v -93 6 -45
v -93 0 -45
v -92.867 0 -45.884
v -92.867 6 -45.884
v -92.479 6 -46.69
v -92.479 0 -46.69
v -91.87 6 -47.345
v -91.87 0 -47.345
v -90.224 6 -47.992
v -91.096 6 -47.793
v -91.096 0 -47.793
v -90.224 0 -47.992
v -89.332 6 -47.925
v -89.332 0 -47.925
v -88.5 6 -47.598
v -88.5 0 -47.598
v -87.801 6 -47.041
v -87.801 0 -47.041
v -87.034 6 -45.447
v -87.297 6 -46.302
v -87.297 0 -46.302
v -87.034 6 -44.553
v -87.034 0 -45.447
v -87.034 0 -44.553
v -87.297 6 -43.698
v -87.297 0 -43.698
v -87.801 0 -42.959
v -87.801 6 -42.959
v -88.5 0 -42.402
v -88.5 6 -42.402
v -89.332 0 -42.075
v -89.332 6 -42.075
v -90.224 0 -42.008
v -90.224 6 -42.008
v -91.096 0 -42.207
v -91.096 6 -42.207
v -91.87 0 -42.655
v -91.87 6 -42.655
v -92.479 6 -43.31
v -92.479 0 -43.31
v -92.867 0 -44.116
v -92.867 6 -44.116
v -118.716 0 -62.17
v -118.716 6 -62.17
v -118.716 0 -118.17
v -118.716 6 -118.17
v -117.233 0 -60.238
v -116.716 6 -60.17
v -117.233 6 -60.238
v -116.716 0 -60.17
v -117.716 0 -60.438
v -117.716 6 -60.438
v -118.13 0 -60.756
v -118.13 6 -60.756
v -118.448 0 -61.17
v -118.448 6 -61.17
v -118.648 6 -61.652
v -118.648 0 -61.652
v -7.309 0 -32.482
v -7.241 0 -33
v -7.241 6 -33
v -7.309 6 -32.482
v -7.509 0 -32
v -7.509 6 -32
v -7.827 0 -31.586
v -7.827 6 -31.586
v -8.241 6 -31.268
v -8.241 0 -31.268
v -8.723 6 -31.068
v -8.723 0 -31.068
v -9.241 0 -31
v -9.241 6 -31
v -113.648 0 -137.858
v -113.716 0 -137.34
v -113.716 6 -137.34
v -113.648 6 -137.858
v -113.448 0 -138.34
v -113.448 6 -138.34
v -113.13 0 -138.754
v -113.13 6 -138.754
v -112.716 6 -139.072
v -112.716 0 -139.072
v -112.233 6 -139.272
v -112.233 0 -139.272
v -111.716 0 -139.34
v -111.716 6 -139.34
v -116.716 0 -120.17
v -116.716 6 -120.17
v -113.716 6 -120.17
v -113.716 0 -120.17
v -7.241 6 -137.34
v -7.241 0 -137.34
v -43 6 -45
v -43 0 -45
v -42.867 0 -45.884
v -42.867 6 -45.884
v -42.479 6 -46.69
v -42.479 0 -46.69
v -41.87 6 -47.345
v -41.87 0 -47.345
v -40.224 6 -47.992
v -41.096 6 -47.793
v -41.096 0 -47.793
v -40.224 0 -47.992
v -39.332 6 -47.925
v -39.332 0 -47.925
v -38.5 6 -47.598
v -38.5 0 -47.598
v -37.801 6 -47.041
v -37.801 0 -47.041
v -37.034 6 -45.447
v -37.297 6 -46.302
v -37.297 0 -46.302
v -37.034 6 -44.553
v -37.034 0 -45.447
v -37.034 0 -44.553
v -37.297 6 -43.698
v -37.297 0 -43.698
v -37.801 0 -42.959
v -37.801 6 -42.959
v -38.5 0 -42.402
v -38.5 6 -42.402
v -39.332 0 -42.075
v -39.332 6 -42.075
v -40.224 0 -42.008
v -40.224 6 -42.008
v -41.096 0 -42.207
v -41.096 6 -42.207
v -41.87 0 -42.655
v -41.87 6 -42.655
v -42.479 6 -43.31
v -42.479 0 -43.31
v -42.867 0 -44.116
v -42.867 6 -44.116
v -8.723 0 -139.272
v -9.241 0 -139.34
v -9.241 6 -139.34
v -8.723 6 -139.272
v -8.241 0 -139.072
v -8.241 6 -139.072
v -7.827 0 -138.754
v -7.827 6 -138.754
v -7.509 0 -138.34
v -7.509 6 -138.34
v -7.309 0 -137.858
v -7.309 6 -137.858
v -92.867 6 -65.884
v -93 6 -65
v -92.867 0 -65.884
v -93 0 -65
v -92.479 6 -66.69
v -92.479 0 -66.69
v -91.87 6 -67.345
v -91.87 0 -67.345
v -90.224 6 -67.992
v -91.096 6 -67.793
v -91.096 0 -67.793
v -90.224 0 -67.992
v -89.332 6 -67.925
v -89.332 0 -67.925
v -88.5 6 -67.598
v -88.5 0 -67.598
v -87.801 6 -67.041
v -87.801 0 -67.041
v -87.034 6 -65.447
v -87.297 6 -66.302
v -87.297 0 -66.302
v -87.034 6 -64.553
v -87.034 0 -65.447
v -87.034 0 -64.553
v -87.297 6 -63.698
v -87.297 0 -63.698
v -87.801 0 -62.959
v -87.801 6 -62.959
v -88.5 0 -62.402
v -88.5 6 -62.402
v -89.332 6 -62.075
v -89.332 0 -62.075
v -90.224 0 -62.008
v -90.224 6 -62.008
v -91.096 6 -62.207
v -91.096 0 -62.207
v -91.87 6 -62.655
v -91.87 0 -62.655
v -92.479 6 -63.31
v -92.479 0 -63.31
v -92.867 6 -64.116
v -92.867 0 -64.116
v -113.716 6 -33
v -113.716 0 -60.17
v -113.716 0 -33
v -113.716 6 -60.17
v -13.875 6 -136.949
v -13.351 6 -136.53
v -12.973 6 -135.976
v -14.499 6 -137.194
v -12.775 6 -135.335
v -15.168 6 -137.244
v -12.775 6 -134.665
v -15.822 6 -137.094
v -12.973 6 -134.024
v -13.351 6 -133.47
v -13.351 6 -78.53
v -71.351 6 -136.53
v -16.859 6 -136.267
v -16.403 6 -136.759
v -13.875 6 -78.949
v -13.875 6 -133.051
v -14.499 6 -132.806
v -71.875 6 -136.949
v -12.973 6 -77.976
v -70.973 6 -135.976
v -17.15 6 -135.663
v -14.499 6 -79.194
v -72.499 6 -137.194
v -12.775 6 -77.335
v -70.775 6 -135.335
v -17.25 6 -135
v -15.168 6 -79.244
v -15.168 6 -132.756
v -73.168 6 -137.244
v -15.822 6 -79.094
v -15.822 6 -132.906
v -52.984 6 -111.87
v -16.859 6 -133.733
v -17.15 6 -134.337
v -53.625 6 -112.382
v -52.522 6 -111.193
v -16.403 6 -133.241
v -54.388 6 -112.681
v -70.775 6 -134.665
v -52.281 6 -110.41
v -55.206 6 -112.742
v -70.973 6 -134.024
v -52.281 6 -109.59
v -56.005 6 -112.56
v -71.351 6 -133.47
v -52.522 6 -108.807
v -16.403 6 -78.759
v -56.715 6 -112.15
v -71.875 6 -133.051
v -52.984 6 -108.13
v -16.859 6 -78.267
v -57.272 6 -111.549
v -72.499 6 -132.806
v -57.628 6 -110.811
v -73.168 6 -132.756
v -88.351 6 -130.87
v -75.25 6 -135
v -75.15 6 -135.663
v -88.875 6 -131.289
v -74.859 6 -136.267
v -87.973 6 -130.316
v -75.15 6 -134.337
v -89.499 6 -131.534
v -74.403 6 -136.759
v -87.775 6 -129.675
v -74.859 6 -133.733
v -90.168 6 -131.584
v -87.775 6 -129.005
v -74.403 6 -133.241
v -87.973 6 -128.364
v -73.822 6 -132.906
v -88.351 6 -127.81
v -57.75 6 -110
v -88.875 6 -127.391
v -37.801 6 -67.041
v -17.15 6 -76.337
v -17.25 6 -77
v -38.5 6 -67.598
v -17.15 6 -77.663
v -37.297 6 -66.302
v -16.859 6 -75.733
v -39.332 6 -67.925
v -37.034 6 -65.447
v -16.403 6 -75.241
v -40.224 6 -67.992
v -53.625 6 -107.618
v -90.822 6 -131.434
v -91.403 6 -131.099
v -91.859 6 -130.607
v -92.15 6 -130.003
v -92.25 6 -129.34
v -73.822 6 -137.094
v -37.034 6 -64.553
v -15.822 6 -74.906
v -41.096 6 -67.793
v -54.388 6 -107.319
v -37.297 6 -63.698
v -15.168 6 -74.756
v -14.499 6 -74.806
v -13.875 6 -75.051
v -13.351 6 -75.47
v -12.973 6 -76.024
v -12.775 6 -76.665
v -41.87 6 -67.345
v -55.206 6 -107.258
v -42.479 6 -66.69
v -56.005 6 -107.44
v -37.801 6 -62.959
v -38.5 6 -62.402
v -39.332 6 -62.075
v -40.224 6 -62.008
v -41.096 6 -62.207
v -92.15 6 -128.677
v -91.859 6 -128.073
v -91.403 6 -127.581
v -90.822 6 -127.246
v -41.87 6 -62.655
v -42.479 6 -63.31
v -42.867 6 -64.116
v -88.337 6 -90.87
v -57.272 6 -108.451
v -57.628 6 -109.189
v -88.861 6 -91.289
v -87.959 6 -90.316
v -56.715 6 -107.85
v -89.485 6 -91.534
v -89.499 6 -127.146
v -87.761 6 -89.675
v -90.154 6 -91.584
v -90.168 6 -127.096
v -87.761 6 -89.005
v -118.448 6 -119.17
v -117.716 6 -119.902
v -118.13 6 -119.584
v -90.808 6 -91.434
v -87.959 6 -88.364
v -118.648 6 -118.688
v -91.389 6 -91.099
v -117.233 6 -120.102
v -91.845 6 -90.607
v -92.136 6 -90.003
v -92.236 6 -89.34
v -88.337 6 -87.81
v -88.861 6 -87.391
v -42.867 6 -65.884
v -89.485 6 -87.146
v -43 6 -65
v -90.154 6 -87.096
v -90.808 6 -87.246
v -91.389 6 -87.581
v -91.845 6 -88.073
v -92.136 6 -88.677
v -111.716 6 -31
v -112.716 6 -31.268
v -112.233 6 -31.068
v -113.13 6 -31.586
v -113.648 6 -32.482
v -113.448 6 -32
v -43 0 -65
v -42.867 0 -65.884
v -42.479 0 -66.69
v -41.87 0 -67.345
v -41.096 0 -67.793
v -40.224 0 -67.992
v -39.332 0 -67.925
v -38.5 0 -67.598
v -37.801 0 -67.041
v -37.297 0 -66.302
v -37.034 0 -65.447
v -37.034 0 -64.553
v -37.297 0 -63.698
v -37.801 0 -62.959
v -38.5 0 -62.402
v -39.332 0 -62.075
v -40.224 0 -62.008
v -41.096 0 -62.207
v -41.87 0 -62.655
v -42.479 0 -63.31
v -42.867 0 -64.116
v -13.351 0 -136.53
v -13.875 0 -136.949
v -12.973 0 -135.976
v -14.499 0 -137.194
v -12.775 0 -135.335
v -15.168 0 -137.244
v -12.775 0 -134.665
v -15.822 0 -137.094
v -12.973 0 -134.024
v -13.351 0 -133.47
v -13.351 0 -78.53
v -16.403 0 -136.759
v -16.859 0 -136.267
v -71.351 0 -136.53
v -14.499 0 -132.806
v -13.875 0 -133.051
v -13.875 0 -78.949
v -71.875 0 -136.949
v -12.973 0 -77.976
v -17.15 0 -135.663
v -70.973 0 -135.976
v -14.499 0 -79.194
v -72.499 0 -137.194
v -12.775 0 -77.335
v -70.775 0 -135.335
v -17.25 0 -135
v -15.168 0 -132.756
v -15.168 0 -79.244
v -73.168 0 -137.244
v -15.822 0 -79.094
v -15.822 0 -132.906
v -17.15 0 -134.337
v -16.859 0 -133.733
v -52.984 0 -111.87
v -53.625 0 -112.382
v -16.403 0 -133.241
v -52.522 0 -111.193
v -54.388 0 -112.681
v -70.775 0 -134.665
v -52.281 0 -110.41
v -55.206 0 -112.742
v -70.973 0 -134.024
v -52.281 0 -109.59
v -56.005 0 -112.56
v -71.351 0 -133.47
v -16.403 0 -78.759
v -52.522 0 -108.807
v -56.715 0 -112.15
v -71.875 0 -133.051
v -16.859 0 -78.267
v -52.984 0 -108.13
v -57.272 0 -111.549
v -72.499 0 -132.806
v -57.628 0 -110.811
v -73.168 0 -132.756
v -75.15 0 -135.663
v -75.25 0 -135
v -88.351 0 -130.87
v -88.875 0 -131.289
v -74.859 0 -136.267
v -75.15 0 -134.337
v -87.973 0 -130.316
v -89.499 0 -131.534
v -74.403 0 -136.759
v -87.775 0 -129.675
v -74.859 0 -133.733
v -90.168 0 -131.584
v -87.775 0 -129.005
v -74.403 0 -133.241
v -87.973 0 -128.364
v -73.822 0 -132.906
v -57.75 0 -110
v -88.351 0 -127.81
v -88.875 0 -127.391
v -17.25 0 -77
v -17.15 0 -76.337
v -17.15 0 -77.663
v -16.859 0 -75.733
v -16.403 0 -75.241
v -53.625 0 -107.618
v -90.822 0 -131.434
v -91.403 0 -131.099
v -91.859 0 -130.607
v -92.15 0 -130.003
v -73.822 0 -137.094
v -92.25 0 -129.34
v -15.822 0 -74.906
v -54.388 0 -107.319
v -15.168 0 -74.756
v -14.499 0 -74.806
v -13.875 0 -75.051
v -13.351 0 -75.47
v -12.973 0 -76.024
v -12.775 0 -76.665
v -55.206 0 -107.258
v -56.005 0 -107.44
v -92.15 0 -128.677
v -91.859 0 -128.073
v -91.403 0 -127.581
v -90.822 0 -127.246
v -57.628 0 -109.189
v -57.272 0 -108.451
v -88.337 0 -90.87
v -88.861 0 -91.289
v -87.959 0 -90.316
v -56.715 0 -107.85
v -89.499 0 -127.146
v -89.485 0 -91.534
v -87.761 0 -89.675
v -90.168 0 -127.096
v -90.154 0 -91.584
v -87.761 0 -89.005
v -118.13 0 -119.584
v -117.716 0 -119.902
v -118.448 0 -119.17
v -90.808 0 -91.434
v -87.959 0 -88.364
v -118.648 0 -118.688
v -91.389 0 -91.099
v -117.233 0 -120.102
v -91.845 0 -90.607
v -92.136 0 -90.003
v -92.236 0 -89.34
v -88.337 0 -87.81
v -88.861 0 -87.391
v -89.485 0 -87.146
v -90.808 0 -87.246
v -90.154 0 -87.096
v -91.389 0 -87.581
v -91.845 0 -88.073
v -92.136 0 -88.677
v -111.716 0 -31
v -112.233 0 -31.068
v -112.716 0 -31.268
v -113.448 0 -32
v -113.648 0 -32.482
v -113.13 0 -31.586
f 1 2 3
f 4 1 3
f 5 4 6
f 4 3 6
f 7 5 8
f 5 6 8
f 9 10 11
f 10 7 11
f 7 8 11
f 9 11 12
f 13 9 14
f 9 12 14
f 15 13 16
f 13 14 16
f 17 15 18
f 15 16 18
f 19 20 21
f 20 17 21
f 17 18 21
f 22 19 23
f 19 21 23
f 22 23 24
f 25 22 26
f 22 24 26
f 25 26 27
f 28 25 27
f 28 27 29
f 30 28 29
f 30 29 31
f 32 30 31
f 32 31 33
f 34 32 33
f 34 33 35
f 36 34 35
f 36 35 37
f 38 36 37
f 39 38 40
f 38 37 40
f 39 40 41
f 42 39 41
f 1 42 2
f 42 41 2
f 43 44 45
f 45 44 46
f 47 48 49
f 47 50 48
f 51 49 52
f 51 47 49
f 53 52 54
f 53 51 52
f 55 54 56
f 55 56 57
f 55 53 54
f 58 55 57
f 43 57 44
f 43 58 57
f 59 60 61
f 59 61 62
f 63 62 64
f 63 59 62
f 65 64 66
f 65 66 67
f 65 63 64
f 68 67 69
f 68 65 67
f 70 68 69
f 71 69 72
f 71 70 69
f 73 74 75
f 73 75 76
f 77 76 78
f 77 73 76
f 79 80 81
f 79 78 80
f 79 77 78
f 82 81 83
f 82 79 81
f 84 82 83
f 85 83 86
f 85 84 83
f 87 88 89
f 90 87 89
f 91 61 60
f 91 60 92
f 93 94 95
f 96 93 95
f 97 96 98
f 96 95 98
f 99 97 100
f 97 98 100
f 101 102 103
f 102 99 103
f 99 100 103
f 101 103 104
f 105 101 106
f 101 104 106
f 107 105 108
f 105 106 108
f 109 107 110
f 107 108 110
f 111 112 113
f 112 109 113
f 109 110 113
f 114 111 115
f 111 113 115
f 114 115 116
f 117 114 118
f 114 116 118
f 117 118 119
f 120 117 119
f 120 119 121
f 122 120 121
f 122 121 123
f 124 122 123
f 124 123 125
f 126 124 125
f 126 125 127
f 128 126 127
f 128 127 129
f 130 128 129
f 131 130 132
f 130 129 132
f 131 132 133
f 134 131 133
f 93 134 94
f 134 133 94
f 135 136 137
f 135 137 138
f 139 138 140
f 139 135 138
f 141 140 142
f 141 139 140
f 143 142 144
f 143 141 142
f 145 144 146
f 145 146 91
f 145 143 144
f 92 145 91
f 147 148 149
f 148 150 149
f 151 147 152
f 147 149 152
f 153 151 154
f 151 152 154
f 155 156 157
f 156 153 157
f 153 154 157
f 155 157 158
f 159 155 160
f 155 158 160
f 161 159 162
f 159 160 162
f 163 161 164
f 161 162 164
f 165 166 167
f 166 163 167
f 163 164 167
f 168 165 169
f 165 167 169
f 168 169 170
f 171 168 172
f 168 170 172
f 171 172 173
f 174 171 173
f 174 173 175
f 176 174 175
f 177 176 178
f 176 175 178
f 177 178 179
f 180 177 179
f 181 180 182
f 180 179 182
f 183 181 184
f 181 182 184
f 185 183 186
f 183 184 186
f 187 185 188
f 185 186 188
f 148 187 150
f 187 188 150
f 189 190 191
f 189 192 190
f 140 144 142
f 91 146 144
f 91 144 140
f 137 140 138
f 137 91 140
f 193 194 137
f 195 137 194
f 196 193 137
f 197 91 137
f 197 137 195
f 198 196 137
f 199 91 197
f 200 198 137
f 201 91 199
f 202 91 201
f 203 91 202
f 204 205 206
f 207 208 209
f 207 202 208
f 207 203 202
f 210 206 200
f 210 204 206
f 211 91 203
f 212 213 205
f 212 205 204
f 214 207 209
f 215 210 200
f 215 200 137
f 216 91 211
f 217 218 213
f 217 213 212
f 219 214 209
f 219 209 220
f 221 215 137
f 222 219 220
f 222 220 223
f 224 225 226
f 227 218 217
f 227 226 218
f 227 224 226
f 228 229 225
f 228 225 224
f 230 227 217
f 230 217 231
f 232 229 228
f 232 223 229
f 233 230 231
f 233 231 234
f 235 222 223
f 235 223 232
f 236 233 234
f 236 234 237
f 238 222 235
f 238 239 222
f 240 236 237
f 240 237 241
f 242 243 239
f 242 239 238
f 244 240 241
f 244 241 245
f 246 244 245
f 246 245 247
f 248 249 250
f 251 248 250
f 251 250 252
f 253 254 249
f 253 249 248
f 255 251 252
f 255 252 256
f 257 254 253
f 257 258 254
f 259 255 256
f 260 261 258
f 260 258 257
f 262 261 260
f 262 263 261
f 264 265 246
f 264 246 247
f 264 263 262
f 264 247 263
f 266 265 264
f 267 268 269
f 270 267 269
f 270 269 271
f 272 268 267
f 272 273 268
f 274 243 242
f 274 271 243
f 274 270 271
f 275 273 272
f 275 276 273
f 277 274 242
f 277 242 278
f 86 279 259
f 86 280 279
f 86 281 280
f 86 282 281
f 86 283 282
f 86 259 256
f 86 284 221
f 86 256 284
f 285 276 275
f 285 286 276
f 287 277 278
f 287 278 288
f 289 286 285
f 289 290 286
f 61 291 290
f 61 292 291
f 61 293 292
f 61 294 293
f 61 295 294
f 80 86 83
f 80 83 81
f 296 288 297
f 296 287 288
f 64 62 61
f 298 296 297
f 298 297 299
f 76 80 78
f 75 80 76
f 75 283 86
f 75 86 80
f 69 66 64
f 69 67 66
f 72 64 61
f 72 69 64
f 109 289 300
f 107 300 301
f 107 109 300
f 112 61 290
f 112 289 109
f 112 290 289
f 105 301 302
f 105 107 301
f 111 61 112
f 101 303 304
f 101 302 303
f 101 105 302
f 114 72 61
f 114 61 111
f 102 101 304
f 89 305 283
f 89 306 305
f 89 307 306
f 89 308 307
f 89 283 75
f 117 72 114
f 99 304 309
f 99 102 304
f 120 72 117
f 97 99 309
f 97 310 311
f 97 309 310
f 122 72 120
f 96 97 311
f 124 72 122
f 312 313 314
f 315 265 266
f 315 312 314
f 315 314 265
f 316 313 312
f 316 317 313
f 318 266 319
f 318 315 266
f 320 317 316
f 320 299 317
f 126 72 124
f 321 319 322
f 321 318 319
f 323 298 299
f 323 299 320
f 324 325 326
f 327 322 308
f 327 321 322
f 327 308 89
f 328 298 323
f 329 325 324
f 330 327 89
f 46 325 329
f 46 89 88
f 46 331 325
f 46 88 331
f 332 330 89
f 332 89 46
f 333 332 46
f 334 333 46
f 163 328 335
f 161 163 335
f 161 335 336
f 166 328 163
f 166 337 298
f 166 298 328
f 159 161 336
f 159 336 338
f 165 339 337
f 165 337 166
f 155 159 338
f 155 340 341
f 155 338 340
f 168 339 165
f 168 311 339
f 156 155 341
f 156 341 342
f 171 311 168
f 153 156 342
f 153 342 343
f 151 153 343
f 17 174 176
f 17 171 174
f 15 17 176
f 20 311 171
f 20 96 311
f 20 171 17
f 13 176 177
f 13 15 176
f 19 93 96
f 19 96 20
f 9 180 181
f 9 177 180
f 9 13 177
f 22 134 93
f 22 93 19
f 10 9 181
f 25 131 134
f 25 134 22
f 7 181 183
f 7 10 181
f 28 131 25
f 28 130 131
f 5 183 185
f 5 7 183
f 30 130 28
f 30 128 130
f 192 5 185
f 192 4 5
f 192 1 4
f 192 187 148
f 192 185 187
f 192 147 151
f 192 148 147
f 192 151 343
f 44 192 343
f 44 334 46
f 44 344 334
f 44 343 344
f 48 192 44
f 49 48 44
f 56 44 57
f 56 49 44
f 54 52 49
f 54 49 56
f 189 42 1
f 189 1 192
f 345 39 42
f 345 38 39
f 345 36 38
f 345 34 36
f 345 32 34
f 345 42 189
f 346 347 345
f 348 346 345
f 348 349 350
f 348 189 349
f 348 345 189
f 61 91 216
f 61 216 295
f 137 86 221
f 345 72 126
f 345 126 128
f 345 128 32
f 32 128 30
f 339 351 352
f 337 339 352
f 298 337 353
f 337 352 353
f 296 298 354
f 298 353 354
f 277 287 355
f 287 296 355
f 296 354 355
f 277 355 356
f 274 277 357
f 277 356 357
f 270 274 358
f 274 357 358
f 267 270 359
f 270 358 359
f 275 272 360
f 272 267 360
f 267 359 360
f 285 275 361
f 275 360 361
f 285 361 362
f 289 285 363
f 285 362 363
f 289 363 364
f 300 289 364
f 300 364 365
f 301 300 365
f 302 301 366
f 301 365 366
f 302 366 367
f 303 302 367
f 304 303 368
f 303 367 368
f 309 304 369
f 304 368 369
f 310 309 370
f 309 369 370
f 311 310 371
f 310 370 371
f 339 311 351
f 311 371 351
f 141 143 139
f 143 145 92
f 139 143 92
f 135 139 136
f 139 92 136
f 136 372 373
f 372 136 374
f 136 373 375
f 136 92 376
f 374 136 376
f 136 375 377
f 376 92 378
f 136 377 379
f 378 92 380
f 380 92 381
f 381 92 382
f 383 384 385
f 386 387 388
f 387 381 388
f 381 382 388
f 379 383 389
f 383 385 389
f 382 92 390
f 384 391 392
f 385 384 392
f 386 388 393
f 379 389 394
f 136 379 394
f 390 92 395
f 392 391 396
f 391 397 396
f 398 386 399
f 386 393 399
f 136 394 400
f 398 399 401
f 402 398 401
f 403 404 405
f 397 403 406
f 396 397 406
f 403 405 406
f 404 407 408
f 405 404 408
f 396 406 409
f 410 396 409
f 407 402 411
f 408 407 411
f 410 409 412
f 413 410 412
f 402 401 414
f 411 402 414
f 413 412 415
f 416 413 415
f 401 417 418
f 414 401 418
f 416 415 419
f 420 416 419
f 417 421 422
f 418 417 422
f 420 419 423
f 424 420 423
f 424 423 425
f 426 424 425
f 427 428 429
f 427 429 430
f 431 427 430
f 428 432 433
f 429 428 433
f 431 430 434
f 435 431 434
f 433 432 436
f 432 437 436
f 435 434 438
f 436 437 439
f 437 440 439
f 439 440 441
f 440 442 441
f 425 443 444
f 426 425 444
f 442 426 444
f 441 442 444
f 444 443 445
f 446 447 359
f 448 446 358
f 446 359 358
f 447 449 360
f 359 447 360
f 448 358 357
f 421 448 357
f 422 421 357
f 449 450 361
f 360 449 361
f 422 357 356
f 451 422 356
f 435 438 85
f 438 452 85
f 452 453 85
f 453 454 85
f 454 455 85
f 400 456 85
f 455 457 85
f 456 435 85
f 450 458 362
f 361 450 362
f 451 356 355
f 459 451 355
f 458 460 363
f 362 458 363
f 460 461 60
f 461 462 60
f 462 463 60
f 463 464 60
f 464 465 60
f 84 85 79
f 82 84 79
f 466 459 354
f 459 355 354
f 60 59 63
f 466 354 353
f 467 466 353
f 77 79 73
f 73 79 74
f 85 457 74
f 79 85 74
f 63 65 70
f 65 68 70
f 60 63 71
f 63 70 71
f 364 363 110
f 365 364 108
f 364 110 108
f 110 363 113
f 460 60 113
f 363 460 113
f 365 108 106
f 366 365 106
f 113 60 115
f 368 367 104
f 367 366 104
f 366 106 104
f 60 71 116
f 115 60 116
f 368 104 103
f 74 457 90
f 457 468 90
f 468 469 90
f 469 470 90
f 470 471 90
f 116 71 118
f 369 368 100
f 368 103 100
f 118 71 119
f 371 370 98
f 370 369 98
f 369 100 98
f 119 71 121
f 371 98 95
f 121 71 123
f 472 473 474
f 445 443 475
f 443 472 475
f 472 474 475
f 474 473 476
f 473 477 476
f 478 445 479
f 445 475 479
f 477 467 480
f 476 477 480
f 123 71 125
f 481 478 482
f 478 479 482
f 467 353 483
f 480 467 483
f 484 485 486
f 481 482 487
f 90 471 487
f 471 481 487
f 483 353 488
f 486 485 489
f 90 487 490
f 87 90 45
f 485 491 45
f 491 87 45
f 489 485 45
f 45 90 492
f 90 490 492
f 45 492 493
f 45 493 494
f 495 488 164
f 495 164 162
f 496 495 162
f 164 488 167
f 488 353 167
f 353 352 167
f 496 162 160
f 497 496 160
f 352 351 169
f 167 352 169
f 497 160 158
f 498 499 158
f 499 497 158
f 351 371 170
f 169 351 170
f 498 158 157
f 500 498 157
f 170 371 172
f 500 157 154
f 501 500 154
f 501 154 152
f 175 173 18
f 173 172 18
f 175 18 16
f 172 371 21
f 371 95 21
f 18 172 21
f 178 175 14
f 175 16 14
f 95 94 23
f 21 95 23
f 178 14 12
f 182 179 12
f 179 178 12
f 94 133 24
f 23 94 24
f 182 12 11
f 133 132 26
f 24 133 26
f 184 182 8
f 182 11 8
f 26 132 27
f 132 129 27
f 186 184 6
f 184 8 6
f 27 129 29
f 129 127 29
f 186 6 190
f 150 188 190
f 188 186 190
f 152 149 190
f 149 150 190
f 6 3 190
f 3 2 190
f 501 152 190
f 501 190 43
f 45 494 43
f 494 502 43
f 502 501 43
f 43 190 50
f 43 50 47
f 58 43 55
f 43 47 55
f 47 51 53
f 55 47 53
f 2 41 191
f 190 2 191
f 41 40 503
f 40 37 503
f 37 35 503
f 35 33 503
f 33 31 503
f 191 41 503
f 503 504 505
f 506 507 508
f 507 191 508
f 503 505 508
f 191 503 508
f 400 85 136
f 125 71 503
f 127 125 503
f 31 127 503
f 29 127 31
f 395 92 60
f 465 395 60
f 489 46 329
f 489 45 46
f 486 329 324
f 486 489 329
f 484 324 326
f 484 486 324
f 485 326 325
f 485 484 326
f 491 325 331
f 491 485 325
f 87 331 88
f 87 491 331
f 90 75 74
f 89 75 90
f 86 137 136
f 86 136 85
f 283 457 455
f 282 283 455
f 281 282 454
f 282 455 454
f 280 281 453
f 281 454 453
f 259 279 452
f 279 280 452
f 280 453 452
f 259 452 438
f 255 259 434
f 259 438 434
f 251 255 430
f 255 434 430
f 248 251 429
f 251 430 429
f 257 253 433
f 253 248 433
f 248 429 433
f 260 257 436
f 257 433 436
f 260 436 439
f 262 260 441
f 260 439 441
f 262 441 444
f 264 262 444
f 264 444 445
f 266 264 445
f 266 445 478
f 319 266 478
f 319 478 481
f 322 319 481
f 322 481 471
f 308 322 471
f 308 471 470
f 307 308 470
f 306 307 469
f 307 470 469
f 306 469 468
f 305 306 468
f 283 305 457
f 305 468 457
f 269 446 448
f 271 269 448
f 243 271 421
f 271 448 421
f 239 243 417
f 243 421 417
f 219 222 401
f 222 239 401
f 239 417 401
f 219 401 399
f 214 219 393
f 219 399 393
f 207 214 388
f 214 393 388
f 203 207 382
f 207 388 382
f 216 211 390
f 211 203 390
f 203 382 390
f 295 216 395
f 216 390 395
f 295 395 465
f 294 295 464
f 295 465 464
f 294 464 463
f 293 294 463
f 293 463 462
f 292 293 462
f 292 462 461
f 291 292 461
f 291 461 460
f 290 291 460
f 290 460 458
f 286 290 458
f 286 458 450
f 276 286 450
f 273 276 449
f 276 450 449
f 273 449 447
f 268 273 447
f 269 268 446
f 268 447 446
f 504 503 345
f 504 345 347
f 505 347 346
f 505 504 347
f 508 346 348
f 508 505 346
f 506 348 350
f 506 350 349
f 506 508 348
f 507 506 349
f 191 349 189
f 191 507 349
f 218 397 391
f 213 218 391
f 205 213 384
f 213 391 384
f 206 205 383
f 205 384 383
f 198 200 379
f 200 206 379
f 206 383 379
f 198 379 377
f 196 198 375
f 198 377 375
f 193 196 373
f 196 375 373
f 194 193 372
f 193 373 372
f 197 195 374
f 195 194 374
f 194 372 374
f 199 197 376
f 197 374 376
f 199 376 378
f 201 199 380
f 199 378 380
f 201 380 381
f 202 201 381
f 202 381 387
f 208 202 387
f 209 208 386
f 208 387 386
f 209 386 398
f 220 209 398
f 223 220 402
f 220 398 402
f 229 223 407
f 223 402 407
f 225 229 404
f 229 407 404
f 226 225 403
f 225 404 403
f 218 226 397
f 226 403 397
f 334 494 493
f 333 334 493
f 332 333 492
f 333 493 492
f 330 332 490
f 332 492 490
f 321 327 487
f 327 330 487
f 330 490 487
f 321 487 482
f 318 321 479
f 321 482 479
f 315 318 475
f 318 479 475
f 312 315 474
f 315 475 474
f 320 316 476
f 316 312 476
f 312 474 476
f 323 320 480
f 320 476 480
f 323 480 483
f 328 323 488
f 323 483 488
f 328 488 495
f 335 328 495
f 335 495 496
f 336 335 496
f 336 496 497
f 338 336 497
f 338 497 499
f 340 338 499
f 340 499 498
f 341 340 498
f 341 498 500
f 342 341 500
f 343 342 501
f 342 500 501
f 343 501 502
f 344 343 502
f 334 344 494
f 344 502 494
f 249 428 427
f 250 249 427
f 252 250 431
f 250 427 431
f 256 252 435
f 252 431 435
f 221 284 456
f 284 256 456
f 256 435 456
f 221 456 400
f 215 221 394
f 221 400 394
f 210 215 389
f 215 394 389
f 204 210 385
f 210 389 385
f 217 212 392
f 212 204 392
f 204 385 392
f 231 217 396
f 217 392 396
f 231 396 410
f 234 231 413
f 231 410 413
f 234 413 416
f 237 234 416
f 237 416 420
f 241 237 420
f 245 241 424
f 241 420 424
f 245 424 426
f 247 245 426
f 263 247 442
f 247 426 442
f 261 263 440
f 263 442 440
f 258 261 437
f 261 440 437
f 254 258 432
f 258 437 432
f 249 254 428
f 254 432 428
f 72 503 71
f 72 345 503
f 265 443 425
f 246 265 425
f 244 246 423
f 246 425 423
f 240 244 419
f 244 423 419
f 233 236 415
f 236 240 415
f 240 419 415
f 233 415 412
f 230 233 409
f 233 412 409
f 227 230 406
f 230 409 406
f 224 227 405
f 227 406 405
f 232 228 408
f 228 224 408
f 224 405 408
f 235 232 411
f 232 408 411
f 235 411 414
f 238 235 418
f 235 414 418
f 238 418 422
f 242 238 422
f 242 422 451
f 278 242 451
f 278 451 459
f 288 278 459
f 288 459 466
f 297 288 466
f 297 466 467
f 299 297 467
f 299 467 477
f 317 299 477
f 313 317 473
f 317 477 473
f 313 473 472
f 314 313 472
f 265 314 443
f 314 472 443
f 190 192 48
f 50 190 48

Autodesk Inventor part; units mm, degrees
ref_plane "YZ Plane" through (0, 0, 0) normal (1, 0, 0) x (0, 1, 0)
ref_plane "XZ Plane" through (0, 0, 0) normal (0, 1, 0) x (-1, 0, 0)
ref_plane "XY Plane" through (0, 0, 0) normal (0, 0, 1) x (1, 0, 0)
sketch "Sketch1" plane through (0, 0, 0) normal (0, 1, 0) x (-1, 0, 0)
  line L0 (232.1908, -176.5808) -> (232.1908, -3.7592)
  arc A0 (232.1908, -3.7592) -> (227.4316, 1) centre (227.4316, -3.7592) ccw
  line L1 (227.4316, 1) -> (0, 1)
  arc A1 (0, 1) -> (-4.7592, -3.7592) centre (0, -3.7592) ccw
  arc A2 (-4.7592, -176.5808) -> (0, -181.34) centre (0, -176.5808) ccw
  arc A3 (227.4316, -181.34) -> (232.1908, -176.5808) centre (227.4316, -176.5808) ccw
  circle A4 centre (130, -129.34) radius 2.25
  circle A5 centre (129.9861, -89.34) radius 2.25
  circle A6 centre (90, -129.34) radius 2.25
  circle A7 centre (89.9861, -89.34) radius 2.25
  circle A8 centre (180, -110) radius 2.75
  circle A9 centre (55, -110) radius 2.75
  circle A10 centre (90, -45) radius 3
  circle A11 centre (190, -45) radius 3
  circle A12 centre (190, -65) radius 3
  circle A13 centre (90, -65) radius 3
  circle A14 centre (140, -45) radius 3
  circle A15 centre (40, -45) radius 3
  circle A16 centre (140, -65) radius 3
  circle A17 centre (40, -65) radius 3
  line L2 (230.1908, -176.5808) -> (230.1908, -3.7592)
  arc A18 (230.1908, -3.7592) -> (227.4316, -1) centre (227.4316, -3.7592) ccw
  line L3 (227.4316, -1) -> (0, -1)
  arc A19 (0, -1) -> (-2.7592, -3.7592) centre (0, -3.7592) ccw
  arc A20 (-2.7592, -176.5808) -> (0, -179.34) centre (0, -176.5808) ccw
  arc A21 (227.4316, -179.34) -> (230.1908, -176.5808) centre (227.4316, -176.5808) ccw
  line L4 (-4.7592, -3.7592) -> (-4.7592, -176.5808)
  line L5 (-2.7592, -3.7592) -> (-2.7592, -176.5808)
  line L6 (0, -179.34) -> (227.4316, -179.34)
  line L7 (227.4316, -181.34) -> (0, -181.34)
  line L8 (0, 0) -> (0, -15)
  line L9 (0, 0) -> (15, 0) construction
  line L10 (0, 0) -> (15, 0)
  line L11 (0, 0) -> (15, 0) construction
  circle A22 centre (15, -135) radius 2.25
  circle A23 centre (73, -135) radius 2.25
  circle A24 centre (15, -77) radius 2.25
  point P0 (230.1908, -3.7592)
  point P1 (0, -1)
  dimension "d0" = 2
  dimension "d1" = 2
  dimension "d2" = 2
  dimension "d3" = 2
  dimension "d5" = 2
  dimension "d7" = 2
  dimension "d8" = 227.4316
  dimension "d9" = 172.8216
  dimension "d10" = 4.7592
  dimension "d45" = 15
  dimension "d46" = 90
  dimension "d47" = 15
  dimension "d48" = 0
  dimension "d49" = 110
  dimension "d50" = 55
  dimension "d51" = 125
  dimension "d52" = 110
  dimension "d54" = 40
  dimension "d55" = 40
  dimension "d56" = 40
  dimension "d57" = 40
  dimension "d58" = 50
  dimension "d59" = 100.1908
  dimension "d60" = 2.7592
  dimension "d61" = 1
  dimension "d62" = 4.7592
  dimension "d63" = 178.34
  dimension "d64" = 180.34
  dimension "d65" = 172.8216
  dimension "d66" = 230.1908
  dimension "d67" = 4.5
  dimension "d68" = 5.5
  dimension "d69" = 6
  dimension "d70" = 40.1908
  dimension "d71" = 64
  dimension "d72" = 20
  dimension "d73" = 50
  dimension "d74" = 50
  dimension "d75" = 50
  dimension "d76" = 20
  dimension "d77" = 20
  dimension "d78" = 20
  dimension "d79" = 50
  dimension "d87" = 4.5
  dimension "d89" = 25
  dimension "d90" = 40
  dimension "d91" = 4.5
  dimension "d92" = 58
  dimension "d93" = 4.5
  dimension "d94" = 58
extrude "Extrusion1" add sketch "Sketch1" along normal blind 6 contours A21 L6 A20 L5 A19 L3 A18 L2
sketch "Sketch2" plane through (0, 6, 0) normal (0, 1, 0) x (1, 0, 0)
  line L0 (-232.1908, 176.5808) -> (-232.1908, 3.7592)
  arc A0 (-232.1908, 3.7592) -> (-227.4316, -1) centre (-227.4316, 3.7592) ccw
  line L1 (-227.4316, -1) -> (0, -1)
  arc A1 (0, -1) -> (4.7592, 3.7592) centre (0, 3.7592) ccw
  arc A2 (4.7592, 176.5808) -> (0, 181.34) centre (0, 176.5808) ccw
  arc A3 (-227.4316, 181.34) -> (-232.1908, 176.5808) centre (-227.4316, 176.5808) ccw
  circle A4 centre (-130, 135) radius 2
  circle A5 centre (-130, 95) radius 2
  circle A6 centre (-90, 135) radius 2
  circle A7 centre (-90, 95) radius 2
  circle A8 centre (-160.0797, 100) radius 2.75
  circle A9 centre (-60.0797, 100) radius 2.75
  circle A10 centre (-90, 45) radius 2.5
  circle A11 centre (-190, 45) radius 2.5
  circle A12 centre (-190, 65) radius 2.5
  circle A13 centre (-90, 65) radius 2.5
  circle A14 centre (-140, 45) radius 2.5
  circle A15 centre (-40, 45) radius 2.5
  circle A16 centre (-140, 65) radius 2.5
  circle A17 centre (-40, 65) radius 2.5
  line L2 (-230.1908, 176.5808) -> (-230.1908, 3.7592)
  arc A18 (-230.1908, 3.7592) -> (-227.4316, 1) centre (-227.4316, 3.7592) ccw
  line L3 (-227.4316, 1) -> (0, 1)
  arc A19 (0, 1) -> (2.7592, 3.7592) centre (0, 3.7592) ccw
  arc A20 (2.7592, 176.5808) -> (0, 179.34) centre (0, 176.5808) ccw
  arc A21 (-227.4316, 179.34) -> (-230.1908, 176.5808) centre (-227.4316, 176.5808) ccw
  line L4 (4.7592, 3.7592) -> (4.7592, 176.5808)
  line L5 (2.7592, 3.7592) -> (2.7592, 176.5808)
  line L6 (0, 179.34) -> (-227.4316, 179.34)
  line L7 (-227.4316, 181.34) -> (0, 181.34)
  line L8 (0, 179.34) -> (-227.4316, 179.34) projected
  line L9 (-113.7158, 179.34) -> (-113.7158, 1)
  line L10 (-227.4316, 1) -> (0, 1) projected
  line L11 (-118.7158, 120.17) -> (-108.7158, 120.17)
  line L12 (-108.7158, 120.17) -> (-108.7158, 60.17)
  line L13 (-108.7158, 60.17) -> (-118.7158, 60.17)
  line L14 (-118.7158, 60.17) -> (-118.7158, 120.17)
  line L15 (-118.7158, 120.17) -> (-108.7158, 60.17) construction
  line L16 (-108.7158, 120.17) -> (-118.7158, 60.17) construction
  line L17 (-113.7158, 179.34) -> (-113.7158, 159.34)
  line L18 (2.7592, 139.34) -> (-230.1908, 139.34)
  line L19 (-230.1908, 139.34) -> (-230.1908, 179.34)
  line L20 (-230.1908, 179.34) -> (2.7592, 179.34)
  line L21 (2.7592, 179.34) -> (2.7592, 139.34)
  line L22 (2.7592, 139.34) -> (-230.1908, 179.34) construction
  line L23 (-230.1908, 139.34) -> (2.7592, 179.34) construction
  line L24 (-113.7158, 1) -> (-113.7158, 16)
  line L25 (-230.1908, 31) -> (2.7592, 31)
  line L26 (2.7592, 31) -> (2.7592, 1)
  line L27 (2.7592, 1) -> (-230.1908, 1)
  line L28 (-230.1908, 1) -> (-230.1908, 31)
  line L29 (-230.1908, 31) -> (2.7592, 1) construction
  line L30 (2.7592, 31) -> (-230.1908, 1) construction
  line L31 (-227.4316, 1) -> (0, 1) projected
  line L32 (-230.1908, 179.34) -> (-200.1908, 179.34)
  line L33 (-200.1908, 179.34) -> (-200.1908, 1)
  line L34 (-200.1908, 1) -> (-230.1908, 1)
  line L35 (-230.1908, 1) -> (-230.1908, 179.34)
  line L36 (2.7592, 1) -> (-7.2408, 1)
  line L37 (-7.2408, 1) -> (-7.2408, 179.34)
  line L38 (-7.2408, 179.34) -> (2.7592, 179.34)
  line L39 (2.7592, 179.34) -> (2.7592, 1)
  point P0 (230.1908, -176.5808)
  point P1 (230.1908, -3.7592)
  point P2 (227.4316, -1)
  point P3 (0, -1)
  point P4 (0, 0)
  point P5 (230.1908, -176.5808)
  point P6 (230.1908, -3.7592)
  point P7 (227.4316, -1)
  point P8 (0, -1)
  point P9 (-113.7158, 90.17)
  point P10 (-113.7158, 120.17)
  point P11 (-113.7158, 60.17)
  point P12 (-113.7158, 1)
  point P13 (0, 1)
  point P14 (-230.1908, 3.7592)
  point P15 (-227.4316, 1)
  point P16 (-113.7158, 139.34)
  point P17 (-7.2408, 139.34)
  point P18 (-7.2408, 31)
  point P19 (-113.7158, 31)
  dimension "d22" = 2
  dimension "d23" = 2
  dimension "d24" = 2
  dimension "d25" = 2
  dimension "d26" = 2
  dimension "d27" = 2
  dimension "d28" = 227.4316
  dimension "d29" = 172.8216
  dimension "d30" = 4.7592
  dimension "d31" = 10
  dimension "d32" = 60
  dimension "d37" = 20
  dimension "d38" = 40
  dimension "d39" = 15
  dimension "d40" = 30
  dimension "d41" = 30
  dimension "d42" = 10
extrude "Extrusion3" cut sketch "Sketch2" against normal through all contours A4 | A5 | A8 | A11 | A12 | A14 | A16 | A21 L6 L33 L18 L2 | L18 L33 L25 L2 | L25 L33 L3 A18 L2 | L33 L6 L9 L18 | L18 L9 L11 L14 L13 L25 L33 | L25 L9 L3 L33 | L9 L6 L37 L18 | L25 L37 L3 L9 | L37 L6 A20 L5 L18 | L18 L5 L25 L37 | L25 L5 A19 L3 L37
fillet "Fillet3" radius 2 6 edges at (-113.7158, 3, -31) (-118.7158, 3, -60.17) (-118.7158, 3, -120.17) (-7.2408, 3, -31) (-7.2408, 3, -139.34) (-113.7158, 3, -139.34)
equation "\"d1\" = d0"
equation "\"d2\" = d0"
equation "\"d3\" = d0"
equation "\"d5\" = d0"
equation "\"d7\" = d0"
equation "\"d23\" = d22"
equation "\"d24\" = d22"
equation "\"d25\" = d22"
equation "\"d26\" = d22"
equation "\"d27\" = d22"
properties part number "EboxBottom_2"
